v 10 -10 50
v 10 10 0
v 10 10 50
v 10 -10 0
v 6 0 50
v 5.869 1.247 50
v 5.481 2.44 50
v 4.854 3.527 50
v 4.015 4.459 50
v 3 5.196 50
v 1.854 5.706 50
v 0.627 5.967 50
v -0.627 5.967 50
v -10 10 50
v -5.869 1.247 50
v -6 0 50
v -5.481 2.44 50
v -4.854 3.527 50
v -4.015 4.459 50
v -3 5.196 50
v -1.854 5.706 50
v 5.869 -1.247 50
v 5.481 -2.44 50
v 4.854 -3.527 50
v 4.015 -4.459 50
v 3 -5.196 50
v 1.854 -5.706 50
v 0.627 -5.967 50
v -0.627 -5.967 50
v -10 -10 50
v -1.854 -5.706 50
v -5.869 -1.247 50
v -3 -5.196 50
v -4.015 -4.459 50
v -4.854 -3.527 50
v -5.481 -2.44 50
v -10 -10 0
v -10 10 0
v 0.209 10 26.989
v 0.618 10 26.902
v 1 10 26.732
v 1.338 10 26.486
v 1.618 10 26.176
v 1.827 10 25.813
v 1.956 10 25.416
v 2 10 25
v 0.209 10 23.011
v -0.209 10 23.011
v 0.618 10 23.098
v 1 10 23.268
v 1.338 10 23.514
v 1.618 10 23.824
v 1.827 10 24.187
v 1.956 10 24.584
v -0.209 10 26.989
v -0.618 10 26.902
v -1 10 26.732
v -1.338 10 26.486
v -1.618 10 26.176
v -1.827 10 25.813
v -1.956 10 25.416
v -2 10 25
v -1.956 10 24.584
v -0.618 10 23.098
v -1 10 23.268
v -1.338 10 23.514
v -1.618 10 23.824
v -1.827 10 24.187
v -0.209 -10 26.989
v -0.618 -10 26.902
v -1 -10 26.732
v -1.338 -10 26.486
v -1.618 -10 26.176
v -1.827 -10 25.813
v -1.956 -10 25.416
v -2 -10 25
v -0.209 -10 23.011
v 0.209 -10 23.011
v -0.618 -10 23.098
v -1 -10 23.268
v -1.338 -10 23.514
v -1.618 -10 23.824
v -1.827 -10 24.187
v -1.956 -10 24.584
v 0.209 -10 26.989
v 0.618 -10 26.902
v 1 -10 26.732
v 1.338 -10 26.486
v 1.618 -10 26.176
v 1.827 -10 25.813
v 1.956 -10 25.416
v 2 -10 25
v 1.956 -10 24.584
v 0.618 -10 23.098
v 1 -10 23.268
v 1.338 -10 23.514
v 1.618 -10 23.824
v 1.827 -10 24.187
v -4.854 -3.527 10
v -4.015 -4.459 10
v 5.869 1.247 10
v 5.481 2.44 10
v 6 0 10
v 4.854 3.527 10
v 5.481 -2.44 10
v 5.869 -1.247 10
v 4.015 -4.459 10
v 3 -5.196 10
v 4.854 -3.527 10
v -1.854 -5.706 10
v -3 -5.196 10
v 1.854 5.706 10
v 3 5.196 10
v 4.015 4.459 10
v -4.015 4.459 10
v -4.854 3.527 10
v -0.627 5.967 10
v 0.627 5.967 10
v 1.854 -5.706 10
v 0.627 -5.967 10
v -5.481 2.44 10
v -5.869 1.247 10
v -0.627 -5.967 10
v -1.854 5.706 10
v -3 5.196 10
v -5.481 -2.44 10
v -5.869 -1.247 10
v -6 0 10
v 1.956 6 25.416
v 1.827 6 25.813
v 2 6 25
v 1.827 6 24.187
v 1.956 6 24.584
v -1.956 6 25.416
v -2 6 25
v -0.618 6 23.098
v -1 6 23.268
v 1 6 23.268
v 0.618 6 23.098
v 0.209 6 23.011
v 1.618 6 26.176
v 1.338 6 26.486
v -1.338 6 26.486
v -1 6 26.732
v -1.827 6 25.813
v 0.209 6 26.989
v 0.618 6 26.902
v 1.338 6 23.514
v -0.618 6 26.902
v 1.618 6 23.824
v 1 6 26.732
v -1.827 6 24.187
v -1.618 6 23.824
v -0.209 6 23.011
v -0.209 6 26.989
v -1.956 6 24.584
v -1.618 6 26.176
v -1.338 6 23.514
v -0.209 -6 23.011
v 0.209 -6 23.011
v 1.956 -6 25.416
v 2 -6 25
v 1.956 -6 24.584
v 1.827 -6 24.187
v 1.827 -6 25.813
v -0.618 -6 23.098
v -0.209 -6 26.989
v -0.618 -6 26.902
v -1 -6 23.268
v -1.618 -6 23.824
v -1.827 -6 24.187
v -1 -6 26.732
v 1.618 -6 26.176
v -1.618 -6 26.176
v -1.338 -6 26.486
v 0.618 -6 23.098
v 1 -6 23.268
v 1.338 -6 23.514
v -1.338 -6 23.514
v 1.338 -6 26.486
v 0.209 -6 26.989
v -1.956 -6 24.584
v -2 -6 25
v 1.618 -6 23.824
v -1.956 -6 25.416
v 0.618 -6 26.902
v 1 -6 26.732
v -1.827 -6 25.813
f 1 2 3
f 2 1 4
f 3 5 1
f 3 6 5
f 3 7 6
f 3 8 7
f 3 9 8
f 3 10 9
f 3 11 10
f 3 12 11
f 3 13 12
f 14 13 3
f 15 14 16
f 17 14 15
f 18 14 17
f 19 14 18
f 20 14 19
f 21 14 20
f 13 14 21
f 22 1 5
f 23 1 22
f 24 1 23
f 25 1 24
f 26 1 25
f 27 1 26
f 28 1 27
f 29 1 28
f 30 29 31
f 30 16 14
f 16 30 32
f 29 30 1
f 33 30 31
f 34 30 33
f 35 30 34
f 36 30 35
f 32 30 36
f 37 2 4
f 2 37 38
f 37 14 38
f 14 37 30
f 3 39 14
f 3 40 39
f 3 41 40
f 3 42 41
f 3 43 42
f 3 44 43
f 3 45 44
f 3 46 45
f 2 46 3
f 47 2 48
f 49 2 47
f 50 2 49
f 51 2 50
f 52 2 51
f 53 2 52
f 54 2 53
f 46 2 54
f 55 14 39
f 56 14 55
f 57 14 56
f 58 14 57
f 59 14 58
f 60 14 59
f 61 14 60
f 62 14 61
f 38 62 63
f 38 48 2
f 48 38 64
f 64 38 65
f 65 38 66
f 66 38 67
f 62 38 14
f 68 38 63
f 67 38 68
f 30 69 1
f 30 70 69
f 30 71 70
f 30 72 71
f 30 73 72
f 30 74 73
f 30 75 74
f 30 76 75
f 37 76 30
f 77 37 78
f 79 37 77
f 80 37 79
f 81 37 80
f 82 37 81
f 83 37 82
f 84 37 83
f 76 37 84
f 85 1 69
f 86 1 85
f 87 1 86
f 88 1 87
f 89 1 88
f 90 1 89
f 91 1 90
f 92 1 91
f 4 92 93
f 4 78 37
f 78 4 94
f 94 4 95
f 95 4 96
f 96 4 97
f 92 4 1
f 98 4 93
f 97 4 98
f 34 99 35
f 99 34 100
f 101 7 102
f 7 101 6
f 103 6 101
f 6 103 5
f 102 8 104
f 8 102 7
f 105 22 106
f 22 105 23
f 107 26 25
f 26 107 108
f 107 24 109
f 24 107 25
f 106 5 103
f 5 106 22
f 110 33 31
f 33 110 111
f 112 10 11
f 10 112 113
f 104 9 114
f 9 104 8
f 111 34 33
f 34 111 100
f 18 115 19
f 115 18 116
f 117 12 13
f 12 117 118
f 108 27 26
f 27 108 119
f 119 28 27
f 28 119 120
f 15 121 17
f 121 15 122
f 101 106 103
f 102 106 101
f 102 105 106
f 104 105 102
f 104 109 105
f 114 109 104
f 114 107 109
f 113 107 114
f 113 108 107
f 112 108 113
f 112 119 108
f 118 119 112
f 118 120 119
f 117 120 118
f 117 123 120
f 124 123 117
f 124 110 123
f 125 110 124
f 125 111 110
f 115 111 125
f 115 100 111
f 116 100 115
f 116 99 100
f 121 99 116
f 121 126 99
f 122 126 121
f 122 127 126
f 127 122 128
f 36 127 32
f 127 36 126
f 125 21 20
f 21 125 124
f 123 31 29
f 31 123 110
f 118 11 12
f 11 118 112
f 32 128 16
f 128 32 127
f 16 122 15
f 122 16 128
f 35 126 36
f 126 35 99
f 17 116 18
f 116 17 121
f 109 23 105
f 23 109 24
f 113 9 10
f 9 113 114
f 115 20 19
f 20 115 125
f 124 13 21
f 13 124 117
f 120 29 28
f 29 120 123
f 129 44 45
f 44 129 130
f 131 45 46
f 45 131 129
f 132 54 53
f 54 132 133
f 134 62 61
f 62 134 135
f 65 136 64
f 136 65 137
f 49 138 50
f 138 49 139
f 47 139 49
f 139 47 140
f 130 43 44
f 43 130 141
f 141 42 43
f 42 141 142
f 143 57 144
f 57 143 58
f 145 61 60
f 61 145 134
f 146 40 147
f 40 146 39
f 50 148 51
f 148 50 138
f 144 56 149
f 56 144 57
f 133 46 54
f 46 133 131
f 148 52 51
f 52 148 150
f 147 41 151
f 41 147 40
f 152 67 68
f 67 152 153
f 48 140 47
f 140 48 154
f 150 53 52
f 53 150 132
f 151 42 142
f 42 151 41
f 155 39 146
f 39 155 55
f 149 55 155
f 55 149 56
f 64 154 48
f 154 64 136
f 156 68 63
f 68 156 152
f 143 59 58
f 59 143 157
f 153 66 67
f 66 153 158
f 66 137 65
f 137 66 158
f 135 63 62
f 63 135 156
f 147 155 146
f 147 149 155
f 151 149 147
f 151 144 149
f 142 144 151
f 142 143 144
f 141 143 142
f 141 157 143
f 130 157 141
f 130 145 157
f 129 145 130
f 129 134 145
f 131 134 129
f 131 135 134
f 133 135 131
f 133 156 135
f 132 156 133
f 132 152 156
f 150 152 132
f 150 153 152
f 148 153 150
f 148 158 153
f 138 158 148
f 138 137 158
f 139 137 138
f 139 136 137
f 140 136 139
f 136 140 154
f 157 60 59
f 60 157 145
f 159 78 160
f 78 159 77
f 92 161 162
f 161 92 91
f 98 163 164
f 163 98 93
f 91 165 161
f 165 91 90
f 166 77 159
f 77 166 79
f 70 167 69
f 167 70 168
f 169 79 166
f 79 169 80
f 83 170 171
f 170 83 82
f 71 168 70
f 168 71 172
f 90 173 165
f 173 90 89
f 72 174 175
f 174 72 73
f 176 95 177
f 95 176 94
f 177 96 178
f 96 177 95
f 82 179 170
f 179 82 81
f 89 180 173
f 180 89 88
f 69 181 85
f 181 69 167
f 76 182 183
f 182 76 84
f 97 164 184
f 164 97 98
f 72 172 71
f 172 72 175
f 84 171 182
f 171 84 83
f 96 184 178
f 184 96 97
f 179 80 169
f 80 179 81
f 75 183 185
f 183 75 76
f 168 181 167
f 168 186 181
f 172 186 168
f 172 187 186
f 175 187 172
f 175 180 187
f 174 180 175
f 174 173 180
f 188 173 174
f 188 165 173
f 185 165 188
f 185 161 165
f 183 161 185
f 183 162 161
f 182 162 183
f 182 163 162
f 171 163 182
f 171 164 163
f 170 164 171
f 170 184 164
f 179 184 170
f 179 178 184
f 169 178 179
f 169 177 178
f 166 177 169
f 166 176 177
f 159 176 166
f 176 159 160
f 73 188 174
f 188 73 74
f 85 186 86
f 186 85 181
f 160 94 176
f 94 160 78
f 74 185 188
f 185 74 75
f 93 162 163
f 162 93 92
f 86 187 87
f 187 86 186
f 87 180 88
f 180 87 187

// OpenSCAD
/*
culture-tube-holder.scad
A modular culture tube holder (in progress)
@author: Suyash Kumar
*/
$fn = 30;
// Parameters (all lens in mm) 

// Base
base_height = 50; 
base_x = 20;
base_y = 20;

// Tube
tube_cutout_height = 40; // Tube is 75 mm
tube_outer_diameter = 12; 

// Instrumentation
led_radius = 2;
led_tip_radius = 1.5; 
led_height = base_height - 25;

module make_base() {
    difference(){
        translate([0, 0, base_height/2])cube([base_x, base_y, base_height], center=true);
        translate([0, 0, base_height-tube_cutout_height])cylinder(d=12, h=tube_cutout_height);
    }
}

module instrumentation_volume() {
    
    union() {
        translate([0,base_y/2,led_height])rotate([90, 0, 0])cylinder(r=led_radius, h=(base_x/2)-tube_outer_diameter/2);
        mirror([0,1,0])translate([0,base_y/2,led_height])rotate([90, 0, 0])cylinder(r=led_radius, h=(base_x/2)-tube_outer_diameter/2);
    }

}

module make_holder() {
    difference() {
        make_base();
        instrumentation_volume();
    }
}

make_holder();
//instrumentation_volume();
